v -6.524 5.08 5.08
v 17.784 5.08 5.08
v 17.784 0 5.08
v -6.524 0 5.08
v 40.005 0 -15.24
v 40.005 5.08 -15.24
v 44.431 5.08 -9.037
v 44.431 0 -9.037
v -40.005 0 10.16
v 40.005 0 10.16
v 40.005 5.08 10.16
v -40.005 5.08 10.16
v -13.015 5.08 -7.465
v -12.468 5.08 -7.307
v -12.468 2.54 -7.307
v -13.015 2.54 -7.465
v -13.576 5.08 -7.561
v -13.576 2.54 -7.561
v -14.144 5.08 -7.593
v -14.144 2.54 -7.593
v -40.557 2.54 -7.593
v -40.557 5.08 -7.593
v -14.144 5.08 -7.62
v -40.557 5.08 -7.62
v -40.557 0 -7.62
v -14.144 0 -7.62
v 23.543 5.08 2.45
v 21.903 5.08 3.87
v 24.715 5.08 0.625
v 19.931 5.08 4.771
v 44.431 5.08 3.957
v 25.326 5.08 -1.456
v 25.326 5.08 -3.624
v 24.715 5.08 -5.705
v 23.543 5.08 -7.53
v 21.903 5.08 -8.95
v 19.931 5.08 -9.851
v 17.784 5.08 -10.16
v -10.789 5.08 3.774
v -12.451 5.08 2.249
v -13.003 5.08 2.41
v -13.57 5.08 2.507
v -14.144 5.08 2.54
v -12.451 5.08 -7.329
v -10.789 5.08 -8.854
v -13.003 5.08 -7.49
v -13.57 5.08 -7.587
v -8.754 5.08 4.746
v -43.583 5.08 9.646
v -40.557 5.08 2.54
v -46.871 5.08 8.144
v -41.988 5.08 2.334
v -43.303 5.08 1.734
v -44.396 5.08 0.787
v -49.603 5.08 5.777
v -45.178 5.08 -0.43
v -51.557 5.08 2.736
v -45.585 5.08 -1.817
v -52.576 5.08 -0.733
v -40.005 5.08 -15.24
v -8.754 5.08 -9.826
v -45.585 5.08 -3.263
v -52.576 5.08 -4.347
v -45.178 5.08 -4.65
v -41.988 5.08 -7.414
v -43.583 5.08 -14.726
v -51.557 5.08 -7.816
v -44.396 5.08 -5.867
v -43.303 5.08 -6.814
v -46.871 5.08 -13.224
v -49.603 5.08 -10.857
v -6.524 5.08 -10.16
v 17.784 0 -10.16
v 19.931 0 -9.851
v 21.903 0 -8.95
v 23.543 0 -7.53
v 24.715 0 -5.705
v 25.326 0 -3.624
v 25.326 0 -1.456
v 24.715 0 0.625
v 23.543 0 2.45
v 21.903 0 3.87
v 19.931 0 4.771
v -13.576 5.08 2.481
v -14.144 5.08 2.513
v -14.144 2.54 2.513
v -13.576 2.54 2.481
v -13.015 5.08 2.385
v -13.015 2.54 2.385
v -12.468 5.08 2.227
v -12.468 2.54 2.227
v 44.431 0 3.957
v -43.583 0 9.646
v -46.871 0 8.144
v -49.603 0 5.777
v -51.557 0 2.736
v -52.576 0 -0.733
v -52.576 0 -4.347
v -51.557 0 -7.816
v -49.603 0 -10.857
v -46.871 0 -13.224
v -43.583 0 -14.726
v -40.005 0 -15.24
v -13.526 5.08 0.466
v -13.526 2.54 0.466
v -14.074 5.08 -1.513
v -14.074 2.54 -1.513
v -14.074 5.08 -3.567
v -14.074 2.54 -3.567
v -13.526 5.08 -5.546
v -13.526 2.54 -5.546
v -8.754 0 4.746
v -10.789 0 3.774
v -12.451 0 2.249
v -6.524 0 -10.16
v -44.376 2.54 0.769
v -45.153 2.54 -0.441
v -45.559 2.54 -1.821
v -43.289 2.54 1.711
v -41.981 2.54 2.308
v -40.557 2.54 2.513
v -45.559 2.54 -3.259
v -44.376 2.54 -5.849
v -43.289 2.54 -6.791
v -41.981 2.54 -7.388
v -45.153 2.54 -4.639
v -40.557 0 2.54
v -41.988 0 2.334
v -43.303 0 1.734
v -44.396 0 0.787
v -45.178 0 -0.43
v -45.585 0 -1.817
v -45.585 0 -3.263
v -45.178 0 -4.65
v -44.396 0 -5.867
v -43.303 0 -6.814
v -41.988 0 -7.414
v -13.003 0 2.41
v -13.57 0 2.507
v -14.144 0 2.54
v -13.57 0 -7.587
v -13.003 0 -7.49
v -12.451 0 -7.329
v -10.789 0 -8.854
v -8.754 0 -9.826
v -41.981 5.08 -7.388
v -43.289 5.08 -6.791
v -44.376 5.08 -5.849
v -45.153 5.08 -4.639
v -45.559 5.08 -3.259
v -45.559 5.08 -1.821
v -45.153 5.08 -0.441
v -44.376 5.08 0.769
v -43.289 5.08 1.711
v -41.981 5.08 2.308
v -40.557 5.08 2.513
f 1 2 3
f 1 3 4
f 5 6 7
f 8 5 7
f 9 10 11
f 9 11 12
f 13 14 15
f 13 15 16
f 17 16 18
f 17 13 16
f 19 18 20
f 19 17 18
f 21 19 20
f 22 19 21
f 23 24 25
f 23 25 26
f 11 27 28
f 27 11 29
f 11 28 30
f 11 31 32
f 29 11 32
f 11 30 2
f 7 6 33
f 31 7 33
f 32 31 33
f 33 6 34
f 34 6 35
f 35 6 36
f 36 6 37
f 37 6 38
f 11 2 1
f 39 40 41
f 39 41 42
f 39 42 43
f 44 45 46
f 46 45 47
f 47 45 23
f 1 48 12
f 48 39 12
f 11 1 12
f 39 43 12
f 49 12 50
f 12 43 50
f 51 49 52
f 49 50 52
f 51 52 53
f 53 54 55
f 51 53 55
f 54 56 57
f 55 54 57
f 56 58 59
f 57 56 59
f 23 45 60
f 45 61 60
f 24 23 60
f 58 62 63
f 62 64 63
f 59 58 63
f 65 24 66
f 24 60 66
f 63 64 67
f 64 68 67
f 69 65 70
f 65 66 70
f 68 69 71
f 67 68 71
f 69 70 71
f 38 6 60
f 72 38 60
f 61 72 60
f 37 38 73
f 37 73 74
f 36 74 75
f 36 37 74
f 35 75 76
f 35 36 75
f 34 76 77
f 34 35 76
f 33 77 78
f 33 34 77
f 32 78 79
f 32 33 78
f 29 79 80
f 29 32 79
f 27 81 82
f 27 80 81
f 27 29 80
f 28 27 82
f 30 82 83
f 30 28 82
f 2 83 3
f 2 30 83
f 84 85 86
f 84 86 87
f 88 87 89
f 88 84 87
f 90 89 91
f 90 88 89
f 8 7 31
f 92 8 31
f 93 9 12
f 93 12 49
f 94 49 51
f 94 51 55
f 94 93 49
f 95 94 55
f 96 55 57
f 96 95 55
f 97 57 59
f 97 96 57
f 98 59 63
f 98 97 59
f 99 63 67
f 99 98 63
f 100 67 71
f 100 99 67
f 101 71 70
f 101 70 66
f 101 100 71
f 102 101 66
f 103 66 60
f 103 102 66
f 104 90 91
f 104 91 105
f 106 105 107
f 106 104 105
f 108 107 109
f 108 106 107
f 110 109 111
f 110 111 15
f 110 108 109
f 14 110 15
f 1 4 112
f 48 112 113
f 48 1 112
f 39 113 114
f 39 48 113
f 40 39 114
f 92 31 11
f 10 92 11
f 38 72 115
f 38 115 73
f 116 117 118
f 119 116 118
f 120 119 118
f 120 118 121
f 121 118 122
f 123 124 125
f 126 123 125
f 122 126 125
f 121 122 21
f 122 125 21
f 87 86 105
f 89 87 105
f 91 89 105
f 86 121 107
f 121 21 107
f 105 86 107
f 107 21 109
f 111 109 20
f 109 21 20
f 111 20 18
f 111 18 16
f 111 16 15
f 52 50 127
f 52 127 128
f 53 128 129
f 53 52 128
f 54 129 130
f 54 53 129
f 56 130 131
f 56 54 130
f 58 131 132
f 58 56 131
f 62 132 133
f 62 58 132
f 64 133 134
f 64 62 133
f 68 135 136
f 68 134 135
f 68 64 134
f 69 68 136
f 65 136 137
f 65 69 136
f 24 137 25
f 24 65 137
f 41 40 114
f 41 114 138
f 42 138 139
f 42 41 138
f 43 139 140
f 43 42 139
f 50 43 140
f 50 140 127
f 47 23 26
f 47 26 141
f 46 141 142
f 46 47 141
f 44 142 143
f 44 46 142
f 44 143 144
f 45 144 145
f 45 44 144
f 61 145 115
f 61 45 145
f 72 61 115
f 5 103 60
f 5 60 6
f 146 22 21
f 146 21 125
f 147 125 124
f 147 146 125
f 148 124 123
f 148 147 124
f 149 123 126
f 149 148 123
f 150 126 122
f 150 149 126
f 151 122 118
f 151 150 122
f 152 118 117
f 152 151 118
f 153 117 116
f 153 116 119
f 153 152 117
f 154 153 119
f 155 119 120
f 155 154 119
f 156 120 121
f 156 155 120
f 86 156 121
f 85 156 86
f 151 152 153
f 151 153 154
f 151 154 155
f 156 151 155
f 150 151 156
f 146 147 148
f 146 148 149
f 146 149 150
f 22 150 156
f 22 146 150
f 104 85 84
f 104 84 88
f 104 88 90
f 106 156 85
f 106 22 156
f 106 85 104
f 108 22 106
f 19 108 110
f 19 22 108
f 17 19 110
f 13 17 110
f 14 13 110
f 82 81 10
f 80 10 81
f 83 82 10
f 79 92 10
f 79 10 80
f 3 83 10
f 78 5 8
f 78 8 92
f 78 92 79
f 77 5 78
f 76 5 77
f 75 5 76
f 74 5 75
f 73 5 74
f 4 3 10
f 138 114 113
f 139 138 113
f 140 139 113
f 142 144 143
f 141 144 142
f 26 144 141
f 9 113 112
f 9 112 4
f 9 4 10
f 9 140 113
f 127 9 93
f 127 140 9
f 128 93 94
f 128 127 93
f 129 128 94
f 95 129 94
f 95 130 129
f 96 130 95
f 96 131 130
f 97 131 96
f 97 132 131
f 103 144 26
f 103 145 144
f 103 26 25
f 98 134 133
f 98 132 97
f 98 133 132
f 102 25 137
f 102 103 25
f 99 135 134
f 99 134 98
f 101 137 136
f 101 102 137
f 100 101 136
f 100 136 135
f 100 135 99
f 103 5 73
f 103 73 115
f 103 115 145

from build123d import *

# Parameters (mm, degrees)
BOSS_EXTRUDE1_DEPTH = 5.08
CUT_EXTRUDE1_DEPTH  = 56.098829616
BOSS_EXTRUDE2_DEPTH = 2.54
CUT_EXTRUDE2_DEPTH  = 56.098829616


with BuildPart() as part:
    # Sketch1 → Boss-Extrude1 (new body)
    with BuildSketch(Plane(origin=(0, 0, 0), x_dir=(1, 0, 0), z_dir=(0, 1, 0))):
        with BuildLine():
            Line((40.005, -10.16), (-40.005, -10.16))
            ThreePointArc((-40.005, -10.16), (-52.705, 2.54), (-40.005, 15.24))
            Line((-40.005, 15.24), (40.005, 15.24))
            ThreePointArc((40.005, 15.24), (52.705, 2.54), (40.005, -10.16))
        make_face()
    extrude(amount=BOSS_EXTRUDE1_DEPTH)

    # Sketch2 → Cut-Extrude1 (cut, through all)
    with BuildSketch(Plane(origin=(0, 5.08, 0), x_dir=(1, 0, 0), z_dir=(0, 1, 0))):
        with BuildLine():
            Line((-6.523950451, 10.16), (17.783749378, 10.16))
            ThreePointArc((17.783749378, 10.16), (25.403749378, 2.54), (17.783749378, -5.08))
            Line((17.783749378, -5.08), (-6.523950451, -5.08))
            ThreePointArc((-6.523950451, -5.08), (-9.807899227, -4.336051224), (-12.450617118, -2.249469931))
            ThreePointArc((-12.450617118, -2.249469931), (-13.284912399, -2.466840683), (-14.143950451, -2.54))
            Line((-14.143950451, -2.54), (-40.556900142, -2.54))
            ThreePointArc((-40.556900142, -2.54), (-45.636900142, 2.54), (-40.556900142, 7.62))
            Line((-40.556900142, 7.62), (-14.143950451, 7.62))
            ThreePointArc((-14.143950451, 7.62), (-13.284912399, 7.546840683), (-12.450617118, 7.329469931))
            ThreePointArc((-12.450617118, 7.329469931), (-9.807899227, 9.416051224), (-6.523950451, 10.16))
        make_face()
    extrude(amount=-CUT_EXTRUDE1_DEPTH, mode=Mode.SUBTRACT)

    # Sketch4 → Cut-Extrude2 (cut, through all)
    with BuildSketch(Plane(origin=(0, 5.08, 0), x_dir=(1, 0, 0), z_dir=(0, 1, 0))):
        Polygon((40.005, 15.24), (44.43129094, 9.037391797), (44.43129094, -3.957391797), (40.005, -10.16), (40.005, -12.227542852), (70.314575482, -12.227542852), (70.314575482, 15.24), align=None)
    extrude(amount=-CUT_EXTRUDE2_DEPTH, mode=Mode.SUBTRACT)


with BuildPart() as body_2:
    # Sketch3 → Boss-Extrude2 (new body)
    with BuildSketch(Plane(origin=(0, 5.08, 0), x_dir=(1, 0, 0), z_dir=(0, 1, 0))):
        with BuildLine():
            Line((-14.143950451, 7.593133552), (-40.556900142, 7.593133552))
            ThreePointArc((-40.556900142, 7.593133552), (-45.610033694, 2.54), (-40.556900142, -2.513133552))
            Line((-40.556900142, -2.513133552), (-14.143950451, -2.513133552))
            ThreePointArc((-14.143950451, -2.513133552), (-13.294110614, -2.441157591), (-12.468480721, -2.227280134))
            ThreePointArc((-12.468480721, -2.227280134), (-14.143950451, 2.54), (-12.468480721, 7.307280134))
            ThreePointArc((-12.468480721, 7.307280134), (-13.294110614, 7.521157591), (-14.143950451, 7.593133552))
        make_face()
    extrude(amount=-BOSS_EXTRUDE2_DEPTH)


solid = Compound([part.part, body_2.part])
